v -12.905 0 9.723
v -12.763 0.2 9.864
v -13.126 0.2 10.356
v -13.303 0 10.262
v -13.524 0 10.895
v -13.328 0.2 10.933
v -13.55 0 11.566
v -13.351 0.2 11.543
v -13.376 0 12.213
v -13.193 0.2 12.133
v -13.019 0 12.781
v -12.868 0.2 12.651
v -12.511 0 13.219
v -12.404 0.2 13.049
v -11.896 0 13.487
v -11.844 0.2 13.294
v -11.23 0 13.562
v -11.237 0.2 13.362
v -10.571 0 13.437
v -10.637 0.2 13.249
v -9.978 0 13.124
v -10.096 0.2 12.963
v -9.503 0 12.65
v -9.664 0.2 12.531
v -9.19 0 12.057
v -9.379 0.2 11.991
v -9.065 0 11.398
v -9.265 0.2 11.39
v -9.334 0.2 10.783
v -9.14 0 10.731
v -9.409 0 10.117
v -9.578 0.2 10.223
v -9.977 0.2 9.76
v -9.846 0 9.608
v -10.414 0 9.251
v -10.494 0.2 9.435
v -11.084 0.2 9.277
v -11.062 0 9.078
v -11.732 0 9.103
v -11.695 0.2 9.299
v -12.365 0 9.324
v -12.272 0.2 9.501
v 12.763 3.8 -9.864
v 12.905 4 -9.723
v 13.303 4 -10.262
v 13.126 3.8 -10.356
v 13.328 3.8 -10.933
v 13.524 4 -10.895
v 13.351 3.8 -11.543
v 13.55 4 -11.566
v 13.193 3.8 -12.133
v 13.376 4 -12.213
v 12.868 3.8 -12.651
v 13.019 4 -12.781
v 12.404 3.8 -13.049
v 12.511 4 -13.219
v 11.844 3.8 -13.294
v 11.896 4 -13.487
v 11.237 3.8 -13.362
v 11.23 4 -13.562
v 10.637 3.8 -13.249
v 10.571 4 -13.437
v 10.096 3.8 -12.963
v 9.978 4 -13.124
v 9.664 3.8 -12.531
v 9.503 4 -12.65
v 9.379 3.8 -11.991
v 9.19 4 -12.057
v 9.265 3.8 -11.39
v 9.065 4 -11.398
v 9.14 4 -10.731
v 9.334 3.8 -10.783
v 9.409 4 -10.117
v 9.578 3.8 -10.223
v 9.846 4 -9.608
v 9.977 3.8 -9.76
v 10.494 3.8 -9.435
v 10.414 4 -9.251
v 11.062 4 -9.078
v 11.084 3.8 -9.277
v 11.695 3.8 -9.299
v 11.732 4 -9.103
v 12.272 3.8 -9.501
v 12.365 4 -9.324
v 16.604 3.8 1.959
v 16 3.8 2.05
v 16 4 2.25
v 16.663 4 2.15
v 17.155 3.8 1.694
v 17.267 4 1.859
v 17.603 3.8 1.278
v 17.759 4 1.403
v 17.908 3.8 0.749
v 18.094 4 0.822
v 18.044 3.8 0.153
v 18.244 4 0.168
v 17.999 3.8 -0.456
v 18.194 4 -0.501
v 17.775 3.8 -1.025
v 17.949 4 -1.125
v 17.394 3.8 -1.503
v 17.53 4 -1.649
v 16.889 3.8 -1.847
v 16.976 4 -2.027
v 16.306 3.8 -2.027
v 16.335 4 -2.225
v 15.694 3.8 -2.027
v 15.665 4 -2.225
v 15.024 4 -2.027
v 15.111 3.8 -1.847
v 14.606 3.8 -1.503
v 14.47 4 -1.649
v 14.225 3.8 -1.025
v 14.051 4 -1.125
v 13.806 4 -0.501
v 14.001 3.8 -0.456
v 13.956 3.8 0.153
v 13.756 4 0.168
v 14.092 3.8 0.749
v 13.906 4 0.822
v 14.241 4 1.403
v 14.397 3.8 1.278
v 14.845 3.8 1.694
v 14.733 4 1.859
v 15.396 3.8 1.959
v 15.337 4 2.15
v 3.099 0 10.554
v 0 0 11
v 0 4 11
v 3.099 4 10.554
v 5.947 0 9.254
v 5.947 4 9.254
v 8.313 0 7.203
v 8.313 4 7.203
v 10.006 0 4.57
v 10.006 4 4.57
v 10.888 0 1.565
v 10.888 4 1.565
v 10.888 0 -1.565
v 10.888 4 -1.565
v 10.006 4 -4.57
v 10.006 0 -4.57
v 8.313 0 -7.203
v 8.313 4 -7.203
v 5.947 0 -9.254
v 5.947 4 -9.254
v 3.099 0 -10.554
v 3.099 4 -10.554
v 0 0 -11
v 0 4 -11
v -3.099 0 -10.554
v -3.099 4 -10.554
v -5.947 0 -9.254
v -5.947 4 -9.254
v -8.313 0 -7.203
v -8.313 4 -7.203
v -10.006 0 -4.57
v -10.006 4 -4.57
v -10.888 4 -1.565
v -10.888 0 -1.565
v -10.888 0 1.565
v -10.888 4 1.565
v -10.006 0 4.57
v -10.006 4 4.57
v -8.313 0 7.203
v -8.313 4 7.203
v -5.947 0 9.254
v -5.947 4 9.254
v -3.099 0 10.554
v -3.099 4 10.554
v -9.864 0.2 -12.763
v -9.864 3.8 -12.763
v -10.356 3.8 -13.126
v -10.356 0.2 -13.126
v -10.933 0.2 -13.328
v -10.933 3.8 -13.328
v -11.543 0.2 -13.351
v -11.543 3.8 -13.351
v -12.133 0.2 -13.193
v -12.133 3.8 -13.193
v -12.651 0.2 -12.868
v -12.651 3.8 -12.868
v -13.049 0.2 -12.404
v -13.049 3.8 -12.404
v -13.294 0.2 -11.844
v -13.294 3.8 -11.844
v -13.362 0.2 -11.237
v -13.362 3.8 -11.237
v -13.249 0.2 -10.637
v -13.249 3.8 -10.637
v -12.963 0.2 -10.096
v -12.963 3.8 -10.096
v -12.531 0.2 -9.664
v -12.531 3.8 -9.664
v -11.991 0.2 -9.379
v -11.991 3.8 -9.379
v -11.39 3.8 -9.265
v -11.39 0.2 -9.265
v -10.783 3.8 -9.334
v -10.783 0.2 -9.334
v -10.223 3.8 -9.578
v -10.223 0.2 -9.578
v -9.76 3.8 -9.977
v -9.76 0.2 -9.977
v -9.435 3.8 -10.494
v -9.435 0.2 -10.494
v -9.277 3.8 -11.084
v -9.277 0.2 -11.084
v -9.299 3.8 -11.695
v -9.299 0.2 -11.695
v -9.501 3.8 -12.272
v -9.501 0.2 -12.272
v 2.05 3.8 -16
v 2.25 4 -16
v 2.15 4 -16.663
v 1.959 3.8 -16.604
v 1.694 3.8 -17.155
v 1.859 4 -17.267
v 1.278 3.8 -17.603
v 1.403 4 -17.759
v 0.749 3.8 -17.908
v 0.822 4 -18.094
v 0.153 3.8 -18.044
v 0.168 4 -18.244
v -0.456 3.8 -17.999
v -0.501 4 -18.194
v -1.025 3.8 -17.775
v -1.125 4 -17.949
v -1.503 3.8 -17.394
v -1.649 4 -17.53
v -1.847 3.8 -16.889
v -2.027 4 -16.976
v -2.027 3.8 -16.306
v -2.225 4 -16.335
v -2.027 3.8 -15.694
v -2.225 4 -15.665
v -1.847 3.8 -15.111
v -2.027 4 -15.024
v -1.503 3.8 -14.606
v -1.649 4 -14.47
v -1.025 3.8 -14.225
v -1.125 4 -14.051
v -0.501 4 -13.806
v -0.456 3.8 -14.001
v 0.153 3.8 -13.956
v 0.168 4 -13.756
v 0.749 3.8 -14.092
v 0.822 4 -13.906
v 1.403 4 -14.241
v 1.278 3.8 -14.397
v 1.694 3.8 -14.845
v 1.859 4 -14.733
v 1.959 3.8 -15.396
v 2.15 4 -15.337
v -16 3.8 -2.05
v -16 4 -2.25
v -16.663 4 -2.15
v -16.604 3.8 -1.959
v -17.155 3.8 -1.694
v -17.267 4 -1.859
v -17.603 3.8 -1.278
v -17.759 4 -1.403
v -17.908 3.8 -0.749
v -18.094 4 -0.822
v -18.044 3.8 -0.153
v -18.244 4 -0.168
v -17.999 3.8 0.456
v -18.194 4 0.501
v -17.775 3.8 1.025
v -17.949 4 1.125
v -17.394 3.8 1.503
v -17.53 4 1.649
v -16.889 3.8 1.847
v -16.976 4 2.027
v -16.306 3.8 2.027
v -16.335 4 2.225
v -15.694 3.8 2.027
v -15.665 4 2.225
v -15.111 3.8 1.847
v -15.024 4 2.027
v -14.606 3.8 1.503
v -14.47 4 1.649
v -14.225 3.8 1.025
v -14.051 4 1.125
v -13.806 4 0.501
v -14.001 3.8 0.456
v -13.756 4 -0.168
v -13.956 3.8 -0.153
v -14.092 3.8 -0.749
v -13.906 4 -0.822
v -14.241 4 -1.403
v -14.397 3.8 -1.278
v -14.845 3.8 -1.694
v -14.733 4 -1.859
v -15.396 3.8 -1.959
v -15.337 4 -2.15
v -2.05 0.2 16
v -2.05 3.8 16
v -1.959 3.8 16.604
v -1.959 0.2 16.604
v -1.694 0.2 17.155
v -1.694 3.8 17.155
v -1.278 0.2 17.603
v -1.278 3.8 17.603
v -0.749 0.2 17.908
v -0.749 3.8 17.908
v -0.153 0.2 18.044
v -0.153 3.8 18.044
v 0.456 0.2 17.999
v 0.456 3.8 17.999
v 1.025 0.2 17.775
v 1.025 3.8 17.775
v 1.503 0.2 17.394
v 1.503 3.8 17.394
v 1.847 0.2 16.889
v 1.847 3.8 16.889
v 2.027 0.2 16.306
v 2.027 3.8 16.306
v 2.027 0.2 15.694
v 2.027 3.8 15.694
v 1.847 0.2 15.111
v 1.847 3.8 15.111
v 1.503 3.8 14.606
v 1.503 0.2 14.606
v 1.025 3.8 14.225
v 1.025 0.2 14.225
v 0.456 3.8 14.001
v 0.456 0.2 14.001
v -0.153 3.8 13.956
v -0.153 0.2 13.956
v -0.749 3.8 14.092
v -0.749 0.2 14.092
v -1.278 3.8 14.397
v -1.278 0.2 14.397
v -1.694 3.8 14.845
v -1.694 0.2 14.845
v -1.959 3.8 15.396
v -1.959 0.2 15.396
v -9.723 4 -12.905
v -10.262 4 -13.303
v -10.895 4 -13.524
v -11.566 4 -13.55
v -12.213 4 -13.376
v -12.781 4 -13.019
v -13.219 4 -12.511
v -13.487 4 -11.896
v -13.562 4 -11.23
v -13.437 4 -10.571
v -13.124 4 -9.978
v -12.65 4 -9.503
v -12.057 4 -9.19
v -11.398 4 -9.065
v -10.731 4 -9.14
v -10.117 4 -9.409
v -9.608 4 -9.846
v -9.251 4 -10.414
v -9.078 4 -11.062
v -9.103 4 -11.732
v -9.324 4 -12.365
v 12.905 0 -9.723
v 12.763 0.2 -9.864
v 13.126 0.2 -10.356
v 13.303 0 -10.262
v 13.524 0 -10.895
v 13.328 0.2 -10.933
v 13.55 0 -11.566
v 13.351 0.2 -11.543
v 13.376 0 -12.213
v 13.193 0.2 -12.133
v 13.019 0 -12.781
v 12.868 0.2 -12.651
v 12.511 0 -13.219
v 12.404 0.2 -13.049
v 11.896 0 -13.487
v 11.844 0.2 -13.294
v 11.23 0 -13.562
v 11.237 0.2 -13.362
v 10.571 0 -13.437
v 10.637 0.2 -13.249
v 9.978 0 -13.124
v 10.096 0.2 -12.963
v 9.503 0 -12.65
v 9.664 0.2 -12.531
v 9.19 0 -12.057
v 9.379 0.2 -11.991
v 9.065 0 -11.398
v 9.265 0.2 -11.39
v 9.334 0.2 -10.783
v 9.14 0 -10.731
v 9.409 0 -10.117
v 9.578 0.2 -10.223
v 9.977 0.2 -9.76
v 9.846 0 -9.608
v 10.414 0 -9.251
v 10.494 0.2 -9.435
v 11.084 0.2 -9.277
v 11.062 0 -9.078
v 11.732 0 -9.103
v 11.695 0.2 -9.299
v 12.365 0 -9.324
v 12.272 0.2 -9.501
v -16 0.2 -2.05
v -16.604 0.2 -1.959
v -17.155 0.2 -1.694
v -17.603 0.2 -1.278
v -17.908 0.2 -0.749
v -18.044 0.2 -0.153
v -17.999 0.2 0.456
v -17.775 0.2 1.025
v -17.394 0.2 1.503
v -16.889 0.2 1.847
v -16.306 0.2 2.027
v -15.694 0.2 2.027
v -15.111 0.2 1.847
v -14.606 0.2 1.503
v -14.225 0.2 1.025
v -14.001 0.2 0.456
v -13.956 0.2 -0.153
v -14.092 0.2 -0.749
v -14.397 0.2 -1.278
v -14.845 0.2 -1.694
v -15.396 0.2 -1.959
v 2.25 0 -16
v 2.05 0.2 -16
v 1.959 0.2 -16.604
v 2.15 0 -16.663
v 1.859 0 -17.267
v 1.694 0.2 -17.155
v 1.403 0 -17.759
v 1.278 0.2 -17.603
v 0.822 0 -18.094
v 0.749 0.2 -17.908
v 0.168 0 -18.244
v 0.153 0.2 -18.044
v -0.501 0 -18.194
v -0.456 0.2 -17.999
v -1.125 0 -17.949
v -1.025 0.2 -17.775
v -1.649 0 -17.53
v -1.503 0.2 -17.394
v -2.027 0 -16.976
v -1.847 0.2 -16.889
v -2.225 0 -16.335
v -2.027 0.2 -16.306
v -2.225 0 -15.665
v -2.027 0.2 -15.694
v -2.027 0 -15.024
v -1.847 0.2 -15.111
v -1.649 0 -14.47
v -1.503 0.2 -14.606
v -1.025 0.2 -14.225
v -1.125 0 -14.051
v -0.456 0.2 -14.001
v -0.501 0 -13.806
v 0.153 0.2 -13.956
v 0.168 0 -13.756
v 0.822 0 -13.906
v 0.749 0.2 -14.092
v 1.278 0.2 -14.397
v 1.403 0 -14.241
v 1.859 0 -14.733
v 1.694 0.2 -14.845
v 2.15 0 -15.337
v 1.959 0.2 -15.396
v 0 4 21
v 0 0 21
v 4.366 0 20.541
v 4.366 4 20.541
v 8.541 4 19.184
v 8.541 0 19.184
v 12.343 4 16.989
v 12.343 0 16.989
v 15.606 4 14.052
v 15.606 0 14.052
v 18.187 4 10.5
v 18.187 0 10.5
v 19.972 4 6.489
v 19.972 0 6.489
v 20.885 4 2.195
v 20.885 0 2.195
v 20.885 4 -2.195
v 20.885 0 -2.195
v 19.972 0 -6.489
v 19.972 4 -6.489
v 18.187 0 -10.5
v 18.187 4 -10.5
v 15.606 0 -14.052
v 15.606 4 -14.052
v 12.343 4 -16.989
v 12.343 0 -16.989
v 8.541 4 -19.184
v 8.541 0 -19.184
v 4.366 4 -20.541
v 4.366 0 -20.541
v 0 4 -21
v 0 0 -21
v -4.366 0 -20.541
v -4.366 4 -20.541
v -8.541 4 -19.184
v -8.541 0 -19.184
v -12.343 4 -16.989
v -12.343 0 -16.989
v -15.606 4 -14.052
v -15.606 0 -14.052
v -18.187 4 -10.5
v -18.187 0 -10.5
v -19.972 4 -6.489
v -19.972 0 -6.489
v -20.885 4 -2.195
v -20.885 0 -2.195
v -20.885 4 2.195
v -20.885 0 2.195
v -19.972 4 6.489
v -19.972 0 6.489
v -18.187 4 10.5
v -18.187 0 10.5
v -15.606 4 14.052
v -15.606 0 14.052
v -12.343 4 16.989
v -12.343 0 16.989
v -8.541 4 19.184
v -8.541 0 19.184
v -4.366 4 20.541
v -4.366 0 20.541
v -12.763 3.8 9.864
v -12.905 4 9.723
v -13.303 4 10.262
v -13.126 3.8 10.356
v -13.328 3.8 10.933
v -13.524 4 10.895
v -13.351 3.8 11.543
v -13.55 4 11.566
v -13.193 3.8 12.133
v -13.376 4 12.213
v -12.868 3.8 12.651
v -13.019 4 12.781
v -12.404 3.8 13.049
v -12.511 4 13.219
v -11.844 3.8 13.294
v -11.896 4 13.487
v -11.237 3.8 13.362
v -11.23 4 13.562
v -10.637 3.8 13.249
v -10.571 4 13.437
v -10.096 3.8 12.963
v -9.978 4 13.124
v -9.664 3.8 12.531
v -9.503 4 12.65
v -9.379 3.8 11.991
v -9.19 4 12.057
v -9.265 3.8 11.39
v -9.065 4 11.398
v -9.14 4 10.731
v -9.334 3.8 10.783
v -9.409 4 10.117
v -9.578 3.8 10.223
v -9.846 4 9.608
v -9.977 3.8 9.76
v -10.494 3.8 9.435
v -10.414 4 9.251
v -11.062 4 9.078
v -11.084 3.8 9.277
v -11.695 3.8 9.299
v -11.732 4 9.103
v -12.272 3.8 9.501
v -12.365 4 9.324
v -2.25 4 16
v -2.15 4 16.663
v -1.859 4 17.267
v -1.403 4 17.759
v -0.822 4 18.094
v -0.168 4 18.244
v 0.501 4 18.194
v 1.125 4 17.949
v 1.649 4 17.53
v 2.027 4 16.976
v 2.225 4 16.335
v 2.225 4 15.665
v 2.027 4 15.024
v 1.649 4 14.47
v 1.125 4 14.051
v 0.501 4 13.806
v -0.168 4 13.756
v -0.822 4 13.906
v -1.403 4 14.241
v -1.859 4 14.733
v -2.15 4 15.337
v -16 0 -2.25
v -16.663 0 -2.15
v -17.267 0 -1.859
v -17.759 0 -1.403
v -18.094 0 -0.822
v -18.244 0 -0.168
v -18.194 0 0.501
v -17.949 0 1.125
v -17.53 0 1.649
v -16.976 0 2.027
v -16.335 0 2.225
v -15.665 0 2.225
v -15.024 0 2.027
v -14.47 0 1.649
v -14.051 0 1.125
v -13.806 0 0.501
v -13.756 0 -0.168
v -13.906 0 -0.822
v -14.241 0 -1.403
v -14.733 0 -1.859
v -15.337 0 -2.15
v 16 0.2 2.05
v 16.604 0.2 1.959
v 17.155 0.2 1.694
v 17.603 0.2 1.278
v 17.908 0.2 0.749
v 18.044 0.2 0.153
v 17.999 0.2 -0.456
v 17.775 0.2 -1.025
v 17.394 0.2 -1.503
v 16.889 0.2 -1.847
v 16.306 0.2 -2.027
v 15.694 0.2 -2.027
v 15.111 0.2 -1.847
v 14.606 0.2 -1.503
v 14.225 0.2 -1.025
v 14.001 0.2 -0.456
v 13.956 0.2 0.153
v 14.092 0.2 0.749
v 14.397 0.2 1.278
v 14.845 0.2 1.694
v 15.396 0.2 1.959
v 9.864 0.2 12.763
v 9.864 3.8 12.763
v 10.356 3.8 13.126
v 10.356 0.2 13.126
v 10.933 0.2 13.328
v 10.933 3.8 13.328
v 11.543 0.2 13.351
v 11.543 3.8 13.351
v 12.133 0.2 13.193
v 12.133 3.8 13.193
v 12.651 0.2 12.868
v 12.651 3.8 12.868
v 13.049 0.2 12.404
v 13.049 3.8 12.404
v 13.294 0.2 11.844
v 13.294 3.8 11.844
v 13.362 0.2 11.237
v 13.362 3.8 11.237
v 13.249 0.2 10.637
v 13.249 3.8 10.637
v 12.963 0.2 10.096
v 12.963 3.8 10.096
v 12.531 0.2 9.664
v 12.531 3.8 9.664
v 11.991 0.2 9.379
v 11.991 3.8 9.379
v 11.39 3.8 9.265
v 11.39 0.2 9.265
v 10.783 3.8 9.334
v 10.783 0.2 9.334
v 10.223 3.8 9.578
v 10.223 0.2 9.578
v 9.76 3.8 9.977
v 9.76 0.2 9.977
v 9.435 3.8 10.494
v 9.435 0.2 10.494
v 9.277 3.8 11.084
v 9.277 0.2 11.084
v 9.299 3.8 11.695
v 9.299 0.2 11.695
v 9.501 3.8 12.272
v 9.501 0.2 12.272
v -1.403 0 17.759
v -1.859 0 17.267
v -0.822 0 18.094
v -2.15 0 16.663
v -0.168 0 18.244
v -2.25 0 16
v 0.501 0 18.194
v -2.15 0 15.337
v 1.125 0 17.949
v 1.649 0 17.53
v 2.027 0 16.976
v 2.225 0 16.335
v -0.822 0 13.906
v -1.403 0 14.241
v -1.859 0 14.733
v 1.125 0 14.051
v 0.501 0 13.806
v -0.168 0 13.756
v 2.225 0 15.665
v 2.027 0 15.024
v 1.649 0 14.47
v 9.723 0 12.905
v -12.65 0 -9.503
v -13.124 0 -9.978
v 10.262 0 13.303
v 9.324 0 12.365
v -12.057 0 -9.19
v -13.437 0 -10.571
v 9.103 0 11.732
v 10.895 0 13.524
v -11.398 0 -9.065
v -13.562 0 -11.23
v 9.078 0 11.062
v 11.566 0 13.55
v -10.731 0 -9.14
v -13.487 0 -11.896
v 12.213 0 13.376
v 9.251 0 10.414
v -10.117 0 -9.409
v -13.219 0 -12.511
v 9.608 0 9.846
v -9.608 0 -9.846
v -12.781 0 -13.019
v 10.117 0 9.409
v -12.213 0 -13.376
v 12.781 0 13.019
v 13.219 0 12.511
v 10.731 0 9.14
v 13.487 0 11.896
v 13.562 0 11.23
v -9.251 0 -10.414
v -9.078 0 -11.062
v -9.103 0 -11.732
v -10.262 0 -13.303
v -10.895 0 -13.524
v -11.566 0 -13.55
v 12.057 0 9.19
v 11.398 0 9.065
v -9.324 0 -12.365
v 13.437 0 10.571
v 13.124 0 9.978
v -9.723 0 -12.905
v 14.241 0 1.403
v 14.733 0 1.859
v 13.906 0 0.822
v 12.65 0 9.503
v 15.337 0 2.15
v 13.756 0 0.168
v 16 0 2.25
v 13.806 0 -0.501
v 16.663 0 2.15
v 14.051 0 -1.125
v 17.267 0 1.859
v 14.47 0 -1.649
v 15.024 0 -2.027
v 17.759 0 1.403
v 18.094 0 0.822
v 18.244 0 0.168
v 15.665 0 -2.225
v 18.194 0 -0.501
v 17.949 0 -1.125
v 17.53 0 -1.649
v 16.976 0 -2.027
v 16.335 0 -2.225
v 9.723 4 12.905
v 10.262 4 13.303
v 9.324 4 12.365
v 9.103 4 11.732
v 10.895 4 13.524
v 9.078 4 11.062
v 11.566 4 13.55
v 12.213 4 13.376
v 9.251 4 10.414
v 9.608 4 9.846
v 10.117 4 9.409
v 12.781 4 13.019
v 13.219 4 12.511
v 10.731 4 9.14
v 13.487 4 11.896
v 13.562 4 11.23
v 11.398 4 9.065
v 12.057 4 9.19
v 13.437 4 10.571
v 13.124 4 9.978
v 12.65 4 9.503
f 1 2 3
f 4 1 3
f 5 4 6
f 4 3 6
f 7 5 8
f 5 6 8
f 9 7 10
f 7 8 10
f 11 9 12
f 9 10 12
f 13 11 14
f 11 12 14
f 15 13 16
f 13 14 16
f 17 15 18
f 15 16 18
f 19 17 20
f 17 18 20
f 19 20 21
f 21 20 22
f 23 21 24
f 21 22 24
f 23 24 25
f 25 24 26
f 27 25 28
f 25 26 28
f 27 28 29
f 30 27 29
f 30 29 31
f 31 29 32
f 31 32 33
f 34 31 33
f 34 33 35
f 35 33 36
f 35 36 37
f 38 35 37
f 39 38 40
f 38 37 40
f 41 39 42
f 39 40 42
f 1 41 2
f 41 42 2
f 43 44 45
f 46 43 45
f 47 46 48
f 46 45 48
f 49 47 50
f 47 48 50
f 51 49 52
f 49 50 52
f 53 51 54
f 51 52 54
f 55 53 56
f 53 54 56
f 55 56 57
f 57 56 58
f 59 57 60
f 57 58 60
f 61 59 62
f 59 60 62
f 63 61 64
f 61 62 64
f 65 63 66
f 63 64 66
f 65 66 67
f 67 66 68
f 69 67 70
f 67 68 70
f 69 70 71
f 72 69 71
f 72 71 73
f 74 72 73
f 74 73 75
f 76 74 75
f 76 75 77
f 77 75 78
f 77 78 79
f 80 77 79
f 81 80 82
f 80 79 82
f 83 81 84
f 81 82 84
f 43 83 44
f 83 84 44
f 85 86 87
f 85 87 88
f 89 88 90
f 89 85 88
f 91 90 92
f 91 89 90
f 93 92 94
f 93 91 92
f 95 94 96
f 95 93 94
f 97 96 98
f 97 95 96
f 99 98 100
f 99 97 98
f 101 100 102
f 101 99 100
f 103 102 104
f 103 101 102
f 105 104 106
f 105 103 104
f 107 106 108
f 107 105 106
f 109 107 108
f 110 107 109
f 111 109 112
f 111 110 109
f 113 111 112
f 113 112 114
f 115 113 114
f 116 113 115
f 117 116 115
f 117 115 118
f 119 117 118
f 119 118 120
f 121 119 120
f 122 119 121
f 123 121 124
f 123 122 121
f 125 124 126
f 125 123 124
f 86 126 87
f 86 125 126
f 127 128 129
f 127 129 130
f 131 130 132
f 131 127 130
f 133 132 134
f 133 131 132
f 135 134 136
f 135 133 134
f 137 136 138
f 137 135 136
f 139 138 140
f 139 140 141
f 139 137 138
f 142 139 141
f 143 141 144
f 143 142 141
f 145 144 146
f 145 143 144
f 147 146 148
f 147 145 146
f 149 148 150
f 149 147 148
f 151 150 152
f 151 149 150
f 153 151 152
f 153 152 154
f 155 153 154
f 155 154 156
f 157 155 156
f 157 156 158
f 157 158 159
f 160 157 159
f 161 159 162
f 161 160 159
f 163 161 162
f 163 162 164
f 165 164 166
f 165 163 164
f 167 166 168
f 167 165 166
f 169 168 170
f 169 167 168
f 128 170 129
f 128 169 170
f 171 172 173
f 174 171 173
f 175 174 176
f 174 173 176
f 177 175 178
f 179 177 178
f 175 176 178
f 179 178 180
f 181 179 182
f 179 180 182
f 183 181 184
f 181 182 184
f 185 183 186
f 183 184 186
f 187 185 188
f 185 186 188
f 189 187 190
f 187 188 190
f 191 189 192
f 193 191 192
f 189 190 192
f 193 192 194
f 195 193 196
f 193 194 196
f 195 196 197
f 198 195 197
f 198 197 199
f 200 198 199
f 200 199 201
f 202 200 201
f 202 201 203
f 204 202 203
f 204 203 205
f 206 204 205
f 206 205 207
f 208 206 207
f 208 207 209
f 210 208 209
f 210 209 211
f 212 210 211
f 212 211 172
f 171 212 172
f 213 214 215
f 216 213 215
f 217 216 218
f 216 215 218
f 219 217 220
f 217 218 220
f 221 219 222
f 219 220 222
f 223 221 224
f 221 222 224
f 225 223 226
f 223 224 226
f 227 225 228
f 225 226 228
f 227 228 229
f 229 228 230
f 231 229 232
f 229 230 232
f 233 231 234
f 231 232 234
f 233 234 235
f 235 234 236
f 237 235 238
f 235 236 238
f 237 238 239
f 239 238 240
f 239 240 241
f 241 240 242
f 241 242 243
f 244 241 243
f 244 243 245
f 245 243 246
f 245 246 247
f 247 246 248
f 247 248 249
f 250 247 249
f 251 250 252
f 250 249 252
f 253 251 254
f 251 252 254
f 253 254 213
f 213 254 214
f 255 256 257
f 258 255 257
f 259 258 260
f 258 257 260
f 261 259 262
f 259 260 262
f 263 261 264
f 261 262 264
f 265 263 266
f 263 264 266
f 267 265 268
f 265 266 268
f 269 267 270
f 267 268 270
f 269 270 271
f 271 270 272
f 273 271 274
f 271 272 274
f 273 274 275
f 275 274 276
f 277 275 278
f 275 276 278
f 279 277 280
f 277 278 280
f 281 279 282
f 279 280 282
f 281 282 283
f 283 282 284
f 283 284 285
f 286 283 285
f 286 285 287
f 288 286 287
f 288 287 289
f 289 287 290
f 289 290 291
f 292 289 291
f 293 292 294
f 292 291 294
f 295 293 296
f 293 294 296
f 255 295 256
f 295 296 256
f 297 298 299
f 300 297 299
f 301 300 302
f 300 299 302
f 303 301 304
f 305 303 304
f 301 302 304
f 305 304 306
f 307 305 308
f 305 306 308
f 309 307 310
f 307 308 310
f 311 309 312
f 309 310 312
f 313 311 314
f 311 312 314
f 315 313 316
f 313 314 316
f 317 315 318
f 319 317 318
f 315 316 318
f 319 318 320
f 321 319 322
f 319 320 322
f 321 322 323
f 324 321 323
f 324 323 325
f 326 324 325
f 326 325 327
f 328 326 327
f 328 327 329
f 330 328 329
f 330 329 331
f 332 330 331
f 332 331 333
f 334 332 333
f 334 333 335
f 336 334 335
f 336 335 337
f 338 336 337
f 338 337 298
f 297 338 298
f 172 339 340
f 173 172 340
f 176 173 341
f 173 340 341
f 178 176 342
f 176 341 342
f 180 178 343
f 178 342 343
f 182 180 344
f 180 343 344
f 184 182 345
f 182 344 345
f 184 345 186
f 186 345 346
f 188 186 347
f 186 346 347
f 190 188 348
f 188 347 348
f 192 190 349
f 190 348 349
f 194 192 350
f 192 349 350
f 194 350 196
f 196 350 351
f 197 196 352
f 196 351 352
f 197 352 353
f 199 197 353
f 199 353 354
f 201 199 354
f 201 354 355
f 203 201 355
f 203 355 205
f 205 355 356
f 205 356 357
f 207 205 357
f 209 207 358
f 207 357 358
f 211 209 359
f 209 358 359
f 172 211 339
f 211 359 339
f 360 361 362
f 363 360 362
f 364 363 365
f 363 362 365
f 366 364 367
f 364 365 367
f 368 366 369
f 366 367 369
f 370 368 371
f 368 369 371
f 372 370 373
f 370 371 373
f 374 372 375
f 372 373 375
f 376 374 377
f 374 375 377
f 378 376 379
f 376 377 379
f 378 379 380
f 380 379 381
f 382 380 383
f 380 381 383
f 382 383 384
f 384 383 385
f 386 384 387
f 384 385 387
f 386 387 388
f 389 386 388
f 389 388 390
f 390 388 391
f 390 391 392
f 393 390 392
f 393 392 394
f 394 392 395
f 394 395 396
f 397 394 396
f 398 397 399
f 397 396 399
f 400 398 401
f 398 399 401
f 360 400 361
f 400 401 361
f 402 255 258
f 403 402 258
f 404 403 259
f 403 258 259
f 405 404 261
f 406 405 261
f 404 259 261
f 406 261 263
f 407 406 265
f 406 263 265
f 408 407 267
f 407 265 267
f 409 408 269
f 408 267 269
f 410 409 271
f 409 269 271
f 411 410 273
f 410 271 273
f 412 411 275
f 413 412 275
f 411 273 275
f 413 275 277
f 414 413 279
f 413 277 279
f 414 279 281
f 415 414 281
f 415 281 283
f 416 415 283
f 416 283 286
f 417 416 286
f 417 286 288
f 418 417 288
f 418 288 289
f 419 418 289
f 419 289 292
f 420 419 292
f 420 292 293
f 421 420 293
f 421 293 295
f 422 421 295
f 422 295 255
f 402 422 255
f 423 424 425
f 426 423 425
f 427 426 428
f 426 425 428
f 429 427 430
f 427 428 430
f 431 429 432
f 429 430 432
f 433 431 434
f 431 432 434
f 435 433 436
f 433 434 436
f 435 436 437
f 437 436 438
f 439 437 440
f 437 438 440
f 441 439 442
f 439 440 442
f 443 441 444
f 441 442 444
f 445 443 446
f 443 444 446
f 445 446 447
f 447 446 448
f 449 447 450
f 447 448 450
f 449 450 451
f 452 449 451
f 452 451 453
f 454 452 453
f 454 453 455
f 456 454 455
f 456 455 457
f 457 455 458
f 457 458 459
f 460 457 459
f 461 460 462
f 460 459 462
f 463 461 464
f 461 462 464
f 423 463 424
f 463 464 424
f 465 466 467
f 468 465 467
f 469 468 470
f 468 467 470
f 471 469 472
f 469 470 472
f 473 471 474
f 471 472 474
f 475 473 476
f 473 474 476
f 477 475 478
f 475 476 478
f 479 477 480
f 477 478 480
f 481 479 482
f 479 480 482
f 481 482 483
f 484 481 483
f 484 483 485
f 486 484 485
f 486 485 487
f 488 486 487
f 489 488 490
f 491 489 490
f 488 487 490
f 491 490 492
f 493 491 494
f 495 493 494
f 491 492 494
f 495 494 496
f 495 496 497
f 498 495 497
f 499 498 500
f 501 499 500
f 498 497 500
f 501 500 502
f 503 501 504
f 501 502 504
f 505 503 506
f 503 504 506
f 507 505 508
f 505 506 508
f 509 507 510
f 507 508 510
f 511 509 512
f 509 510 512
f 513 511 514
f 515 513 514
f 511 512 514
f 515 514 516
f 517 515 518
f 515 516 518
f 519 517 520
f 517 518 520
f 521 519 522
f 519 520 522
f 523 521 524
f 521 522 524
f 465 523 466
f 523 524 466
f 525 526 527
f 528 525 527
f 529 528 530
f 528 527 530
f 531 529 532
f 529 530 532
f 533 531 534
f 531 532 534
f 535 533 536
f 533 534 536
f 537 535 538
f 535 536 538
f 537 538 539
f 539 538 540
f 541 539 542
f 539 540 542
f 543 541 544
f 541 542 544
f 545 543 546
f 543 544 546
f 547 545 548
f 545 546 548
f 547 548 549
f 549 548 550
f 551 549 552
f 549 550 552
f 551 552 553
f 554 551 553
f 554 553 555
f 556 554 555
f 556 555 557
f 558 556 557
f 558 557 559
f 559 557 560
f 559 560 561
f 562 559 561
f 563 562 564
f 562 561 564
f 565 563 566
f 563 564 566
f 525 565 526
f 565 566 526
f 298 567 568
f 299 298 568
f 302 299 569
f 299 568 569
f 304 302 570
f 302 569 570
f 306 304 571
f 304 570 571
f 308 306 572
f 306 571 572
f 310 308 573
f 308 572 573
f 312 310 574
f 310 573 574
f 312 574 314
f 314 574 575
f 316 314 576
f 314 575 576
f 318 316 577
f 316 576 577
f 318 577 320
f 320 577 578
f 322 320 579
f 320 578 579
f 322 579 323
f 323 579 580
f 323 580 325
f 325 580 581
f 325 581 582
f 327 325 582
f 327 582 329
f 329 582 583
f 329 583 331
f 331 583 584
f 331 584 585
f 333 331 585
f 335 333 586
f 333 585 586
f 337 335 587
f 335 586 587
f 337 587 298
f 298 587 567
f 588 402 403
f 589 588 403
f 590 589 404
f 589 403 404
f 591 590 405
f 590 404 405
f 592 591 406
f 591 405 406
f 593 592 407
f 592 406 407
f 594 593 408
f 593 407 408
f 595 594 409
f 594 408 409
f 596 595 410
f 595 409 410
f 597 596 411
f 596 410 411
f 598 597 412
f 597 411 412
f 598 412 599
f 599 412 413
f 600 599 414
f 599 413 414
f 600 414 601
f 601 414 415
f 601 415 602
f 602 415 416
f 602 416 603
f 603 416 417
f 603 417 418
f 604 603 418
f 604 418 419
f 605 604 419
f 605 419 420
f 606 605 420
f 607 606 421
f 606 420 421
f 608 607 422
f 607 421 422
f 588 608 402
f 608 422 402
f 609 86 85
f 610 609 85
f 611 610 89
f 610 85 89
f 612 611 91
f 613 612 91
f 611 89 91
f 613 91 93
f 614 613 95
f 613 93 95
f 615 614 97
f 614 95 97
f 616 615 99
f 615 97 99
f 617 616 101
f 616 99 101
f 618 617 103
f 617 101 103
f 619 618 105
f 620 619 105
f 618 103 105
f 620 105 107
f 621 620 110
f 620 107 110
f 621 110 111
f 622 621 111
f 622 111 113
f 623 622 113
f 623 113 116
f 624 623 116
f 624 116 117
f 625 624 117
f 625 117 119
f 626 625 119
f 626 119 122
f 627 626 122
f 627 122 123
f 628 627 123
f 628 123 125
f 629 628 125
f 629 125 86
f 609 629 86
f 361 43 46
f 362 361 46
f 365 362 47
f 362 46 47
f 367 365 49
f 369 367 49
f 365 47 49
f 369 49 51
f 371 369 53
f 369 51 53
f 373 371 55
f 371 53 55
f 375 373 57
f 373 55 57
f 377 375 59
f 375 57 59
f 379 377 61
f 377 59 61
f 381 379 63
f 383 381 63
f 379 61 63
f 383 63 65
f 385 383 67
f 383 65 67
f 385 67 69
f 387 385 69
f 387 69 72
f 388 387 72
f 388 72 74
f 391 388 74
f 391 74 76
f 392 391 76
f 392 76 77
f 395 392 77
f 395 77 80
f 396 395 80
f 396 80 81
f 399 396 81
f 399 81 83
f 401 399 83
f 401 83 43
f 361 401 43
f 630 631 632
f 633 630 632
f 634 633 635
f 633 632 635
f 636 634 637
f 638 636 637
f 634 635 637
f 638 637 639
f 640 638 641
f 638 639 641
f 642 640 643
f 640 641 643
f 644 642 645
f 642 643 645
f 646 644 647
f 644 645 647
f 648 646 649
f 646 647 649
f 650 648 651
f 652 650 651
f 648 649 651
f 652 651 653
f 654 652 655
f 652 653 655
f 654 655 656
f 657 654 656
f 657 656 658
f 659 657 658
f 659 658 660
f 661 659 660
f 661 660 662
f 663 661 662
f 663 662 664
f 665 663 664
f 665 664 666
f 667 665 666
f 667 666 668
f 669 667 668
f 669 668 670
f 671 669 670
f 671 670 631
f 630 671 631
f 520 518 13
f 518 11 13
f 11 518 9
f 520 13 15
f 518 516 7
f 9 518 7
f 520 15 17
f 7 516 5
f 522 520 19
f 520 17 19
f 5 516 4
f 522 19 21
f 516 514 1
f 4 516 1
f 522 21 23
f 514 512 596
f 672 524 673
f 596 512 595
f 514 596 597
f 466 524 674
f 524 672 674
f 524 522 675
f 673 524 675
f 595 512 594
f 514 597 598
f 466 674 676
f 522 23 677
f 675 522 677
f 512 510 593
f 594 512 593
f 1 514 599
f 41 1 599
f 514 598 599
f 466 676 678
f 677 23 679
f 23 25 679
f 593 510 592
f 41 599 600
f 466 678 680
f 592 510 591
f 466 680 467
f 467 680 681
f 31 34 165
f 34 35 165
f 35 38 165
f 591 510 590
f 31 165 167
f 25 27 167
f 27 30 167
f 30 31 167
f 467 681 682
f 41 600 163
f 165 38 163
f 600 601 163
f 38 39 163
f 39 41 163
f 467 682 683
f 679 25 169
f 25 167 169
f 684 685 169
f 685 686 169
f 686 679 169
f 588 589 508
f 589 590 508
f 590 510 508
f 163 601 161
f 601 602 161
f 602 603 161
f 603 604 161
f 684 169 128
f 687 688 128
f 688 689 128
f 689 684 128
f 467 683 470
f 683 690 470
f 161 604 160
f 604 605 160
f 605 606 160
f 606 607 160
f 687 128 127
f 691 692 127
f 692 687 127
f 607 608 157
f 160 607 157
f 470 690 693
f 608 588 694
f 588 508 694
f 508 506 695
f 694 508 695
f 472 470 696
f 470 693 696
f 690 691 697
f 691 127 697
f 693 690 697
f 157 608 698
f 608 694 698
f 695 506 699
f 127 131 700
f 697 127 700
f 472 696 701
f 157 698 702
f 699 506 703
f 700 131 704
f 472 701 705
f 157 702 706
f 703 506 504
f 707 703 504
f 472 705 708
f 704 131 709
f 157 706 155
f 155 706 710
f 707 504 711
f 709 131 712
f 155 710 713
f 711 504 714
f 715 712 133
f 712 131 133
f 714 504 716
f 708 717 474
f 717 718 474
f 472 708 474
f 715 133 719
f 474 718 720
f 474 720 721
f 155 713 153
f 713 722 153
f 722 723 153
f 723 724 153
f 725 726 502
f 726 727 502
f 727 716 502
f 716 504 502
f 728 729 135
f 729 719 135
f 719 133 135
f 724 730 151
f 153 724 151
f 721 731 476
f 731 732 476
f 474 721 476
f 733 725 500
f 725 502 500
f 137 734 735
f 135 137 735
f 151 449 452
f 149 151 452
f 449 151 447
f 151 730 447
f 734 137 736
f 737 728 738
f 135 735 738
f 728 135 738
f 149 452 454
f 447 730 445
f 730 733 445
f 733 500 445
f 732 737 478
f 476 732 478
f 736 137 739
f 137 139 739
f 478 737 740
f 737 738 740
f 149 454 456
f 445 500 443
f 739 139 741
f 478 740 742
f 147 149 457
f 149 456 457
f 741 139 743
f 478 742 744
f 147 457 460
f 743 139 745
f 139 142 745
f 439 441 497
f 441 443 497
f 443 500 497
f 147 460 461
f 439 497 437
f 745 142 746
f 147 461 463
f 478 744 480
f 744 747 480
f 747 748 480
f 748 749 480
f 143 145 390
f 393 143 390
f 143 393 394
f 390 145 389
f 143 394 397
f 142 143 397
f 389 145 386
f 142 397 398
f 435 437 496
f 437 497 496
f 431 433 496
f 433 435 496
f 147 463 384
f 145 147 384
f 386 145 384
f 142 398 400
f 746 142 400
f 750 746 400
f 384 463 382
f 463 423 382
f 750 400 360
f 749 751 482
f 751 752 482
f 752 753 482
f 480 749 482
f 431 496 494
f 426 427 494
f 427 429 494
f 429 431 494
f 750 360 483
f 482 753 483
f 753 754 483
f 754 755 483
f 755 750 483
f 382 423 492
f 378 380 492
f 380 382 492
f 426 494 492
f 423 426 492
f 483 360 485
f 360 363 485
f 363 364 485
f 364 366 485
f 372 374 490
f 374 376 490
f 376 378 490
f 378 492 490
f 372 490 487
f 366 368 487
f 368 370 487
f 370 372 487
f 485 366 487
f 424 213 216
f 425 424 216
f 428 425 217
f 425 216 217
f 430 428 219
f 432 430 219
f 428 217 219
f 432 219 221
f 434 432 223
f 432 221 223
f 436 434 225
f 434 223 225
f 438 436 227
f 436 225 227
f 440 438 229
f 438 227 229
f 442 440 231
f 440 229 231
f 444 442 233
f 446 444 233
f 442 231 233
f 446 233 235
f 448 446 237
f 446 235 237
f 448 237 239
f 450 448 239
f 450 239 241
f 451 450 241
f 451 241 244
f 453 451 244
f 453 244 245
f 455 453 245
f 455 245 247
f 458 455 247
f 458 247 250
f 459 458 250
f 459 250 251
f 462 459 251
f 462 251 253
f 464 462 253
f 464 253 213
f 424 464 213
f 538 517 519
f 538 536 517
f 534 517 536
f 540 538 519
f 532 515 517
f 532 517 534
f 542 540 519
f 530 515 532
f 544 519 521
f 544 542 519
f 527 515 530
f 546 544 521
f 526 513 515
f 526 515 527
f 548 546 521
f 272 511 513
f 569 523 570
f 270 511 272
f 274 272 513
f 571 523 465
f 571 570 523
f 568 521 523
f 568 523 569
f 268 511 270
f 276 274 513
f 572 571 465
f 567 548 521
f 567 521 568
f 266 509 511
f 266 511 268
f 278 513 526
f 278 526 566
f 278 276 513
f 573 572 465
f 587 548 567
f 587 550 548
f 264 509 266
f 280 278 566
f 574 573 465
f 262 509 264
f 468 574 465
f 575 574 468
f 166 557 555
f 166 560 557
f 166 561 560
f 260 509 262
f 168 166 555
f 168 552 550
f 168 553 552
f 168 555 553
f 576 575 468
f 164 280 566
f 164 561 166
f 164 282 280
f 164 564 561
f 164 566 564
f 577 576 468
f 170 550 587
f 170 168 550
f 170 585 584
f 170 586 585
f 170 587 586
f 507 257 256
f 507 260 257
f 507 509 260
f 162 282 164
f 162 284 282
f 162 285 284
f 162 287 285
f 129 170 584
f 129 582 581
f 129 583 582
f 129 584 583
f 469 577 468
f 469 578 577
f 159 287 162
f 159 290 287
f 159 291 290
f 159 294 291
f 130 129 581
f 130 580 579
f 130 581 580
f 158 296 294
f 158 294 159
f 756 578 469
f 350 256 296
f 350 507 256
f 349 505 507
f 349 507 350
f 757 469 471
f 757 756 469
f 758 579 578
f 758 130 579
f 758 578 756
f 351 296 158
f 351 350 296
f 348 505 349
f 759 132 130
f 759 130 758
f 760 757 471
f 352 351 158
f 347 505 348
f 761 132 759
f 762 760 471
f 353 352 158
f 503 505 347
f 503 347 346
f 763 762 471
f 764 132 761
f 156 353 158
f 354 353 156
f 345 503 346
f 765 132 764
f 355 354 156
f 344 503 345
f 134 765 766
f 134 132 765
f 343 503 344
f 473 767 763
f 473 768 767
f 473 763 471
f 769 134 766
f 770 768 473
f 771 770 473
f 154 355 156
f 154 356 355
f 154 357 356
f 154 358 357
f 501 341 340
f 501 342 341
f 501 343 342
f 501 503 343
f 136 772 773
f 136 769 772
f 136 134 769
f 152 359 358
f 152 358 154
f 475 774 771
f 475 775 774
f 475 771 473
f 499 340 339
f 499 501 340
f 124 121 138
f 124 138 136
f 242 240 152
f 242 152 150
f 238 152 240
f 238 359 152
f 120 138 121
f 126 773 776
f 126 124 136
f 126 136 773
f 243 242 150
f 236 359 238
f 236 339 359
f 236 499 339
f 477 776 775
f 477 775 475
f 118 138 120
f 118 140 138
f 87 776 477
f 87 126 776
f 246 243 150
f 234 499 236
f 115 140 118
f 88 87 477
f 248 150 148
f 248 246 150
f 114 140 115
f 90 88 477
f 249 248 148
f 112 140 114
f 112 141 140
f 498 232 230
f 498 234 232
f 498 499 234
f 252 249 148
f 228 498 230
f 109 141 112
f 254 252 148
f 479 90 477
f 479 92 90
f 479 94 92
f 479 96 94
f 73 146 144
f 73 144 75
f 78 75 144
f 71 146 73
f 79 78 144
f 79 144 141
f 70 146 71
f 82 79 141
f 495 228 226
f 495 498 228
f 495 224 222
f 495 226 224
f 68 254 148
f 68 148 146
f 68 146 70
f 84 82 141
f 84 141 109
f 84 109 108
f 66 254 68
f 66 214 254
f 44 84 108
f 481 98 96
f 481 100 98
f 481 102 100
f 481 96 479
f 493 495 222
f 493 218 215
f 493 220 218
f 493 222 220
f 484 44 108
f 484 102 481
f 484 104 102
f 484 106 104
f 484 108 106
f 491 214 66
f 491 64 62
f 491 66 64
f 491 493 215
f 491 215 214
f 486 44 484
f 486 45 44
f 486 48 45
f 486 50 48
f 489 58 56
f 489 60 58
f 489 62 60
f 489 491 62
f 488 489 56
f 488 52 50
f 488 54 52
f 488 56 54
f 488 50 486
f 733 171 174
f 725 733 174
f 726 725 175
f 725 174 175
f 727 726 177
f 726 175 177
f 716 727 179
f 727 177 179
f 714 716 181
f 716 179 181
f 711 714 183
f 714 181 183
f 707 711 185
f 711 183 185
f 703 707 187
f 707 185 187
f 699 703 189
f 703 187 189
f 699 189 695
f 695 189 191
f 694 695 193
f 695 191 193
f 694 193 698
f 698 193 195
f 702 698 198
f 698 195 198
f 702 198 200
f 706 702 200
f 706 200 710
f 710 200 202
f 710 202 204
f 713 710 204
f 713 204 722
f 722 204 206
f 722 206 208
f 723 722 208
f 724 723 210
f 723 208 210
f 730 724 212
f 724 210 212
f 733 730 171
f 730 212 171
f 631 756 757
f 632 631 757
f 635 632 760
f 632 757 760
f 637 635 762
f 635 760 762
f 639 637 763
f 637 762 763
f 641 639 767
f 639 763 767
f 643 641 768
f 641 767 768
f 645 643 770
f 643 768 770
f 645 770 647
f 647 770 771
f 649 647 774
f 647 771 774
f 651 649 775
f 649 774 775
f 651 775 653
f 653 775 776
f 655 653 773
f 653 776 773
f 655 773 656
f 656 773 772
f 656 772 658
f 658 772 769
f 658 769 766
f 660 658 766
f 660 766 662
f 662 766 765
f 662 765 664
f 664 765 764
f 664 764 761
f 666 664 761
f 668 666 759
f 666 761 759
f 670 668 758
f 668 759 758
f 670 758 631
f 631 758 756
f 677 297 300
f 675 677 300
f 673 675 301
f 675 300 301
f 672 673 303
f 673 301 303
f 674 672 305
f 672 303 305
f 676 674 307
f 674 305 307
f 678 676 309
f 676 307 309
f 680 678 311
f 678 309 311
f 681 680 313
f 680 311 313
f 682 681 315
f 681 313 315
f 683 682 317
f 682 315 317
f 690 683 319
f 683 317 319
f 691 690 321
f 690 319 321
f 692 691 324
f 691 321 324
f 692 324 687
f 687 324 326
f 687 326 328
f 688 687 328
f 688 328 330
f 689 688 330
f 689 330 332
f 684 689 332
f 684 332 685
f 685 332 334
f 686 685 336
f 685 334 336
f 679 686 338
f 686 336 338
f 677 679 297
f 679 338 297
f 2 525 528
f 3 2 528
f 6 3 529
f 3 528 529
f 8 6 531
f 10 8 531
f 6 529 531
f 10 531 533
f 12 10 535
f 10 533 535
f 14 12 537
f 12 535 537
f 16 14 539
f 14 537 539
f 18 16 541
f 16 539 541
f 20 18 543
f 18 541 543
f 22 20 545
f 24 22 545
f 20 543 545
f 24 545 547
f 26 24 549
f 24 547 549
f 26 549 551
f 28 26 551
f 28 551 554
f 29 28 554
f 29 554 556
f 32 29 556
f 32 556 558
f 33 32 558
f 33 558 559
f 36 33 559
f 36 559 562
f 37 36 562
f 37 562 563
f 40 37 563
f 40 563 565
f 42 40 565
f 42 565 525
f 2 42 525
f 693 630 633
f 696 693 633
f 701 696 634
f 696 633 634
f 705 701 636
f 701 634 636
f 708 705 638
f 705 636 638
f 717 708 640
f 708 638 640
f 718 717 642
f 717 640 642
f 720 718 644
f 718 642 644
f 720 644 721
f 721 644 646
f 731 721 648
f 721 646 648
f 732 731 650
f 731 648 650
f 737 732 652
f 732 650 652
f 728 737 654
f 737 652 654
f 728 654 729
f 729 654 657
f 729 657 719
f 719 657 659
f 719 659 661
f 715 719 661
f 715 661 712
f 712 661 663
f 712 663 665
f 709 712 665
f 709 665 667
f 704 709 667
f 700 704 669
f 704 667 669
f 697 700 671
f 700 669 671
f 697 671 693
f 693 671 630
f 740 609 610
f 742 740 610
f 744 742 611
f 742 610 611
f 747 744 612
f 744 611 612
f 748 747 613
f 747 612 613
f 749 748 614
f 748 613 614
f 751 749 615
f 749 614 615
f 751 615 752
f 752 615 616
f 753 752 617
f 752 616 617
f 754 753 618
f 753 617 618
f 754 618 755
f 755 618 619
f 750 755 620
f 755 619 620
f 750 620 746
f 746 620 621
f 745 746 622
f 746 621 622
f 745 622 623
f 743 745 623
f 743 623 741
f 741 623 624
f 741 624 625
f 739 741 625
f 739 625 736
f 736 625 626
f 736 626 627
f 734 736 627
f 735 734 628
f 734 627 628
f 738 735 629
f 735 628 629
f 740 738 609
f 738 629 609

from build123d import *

# Parameters (mm, degrees)
SKETCH1_R                    = 21
SKETCH1_R_2                  = 16
SKETCH1_R_3                  = 11
BOSS_EXTRUDE1_DEPTH          = 4
SKETCH2_R                    = 2.05
CUT_EXTRUDE1_DEPTH           = 30.966648128
CHAMFER1_SIZE                = 0.2
CIRPATTERN1_COUNT            = 8
CHAMFER1_OF_CIRPATTERN1_SIZE = 0.2


with BuildPart() as part:
    # Sketch1 → Boss-Extrude1 (new body)
    # profile 1 of 2: a face of its own
    with BuildSketch(Plane(origin=(0, 0, 0), x_dir=(1, 0, 0), z_dir=(0, 1, 0))):
        with Locations(Location((0, 0, 0), (0, 0, 270))):
            Circle(SKETCH1_R)
        Circle(SKETCH1_R_2, mode=Mode.SUBTRACT)
    # profile 2 of 2: a face of its own
    with BuildSketch(Plane(origin=(0, 0, 0), x_dir=(1, 0, 0), z_dir=(0, 1, 0))):
        Circle(SKETCH1_R_2)
        with Locations(Location((0, 0, 0), (0, 0, 270))):
            Circle(SKETCH1_R_3, mode=Mode.SUBTRACT)
    extrude(amount=BOSS_EXTRUDE1_DEPTH)

    # Sketch2 → Cut-Extrude1 (cut, through all)
    with BuildSketch(Plane(origin=(0, 4, 0), x_dir=(1, 0, 0), z_dir=(0, 1, 0))):
        with Locations(Location((16, 0, 0), (0, 0, 270))):
            Circle(SKETCH2_R)
    cut_extrude1 = extrude(amount=-CUT_EXTRUDE1_DEPTH, mode=Mode.SUBTRACT)

    # Chamfer1
    chamfer1_edges = [part.edges().sort_by_distance(p)[0] for p in [
        (16, 0, -2.05),
        (16, 4, -2.05),
    ]]
    chamfer(chamfer1_edges, length=CHAMFER1_SIZE)

    # CirPattern1: Cut-Extrude1 ×8 about axis
    cirpattern1_axis = Axis((0, 0, 0), (0, 1, 0))
    for i in range(1, CIRPATTERN1_COUNT):
        add(cut_extrude1.rotate(cirpattern1_axis, i * 360 / CIRPATTERN1_COUNT), mode=Mode.SUBTRACT)

    # Chamfer1 of CirPattern1
    chamfer1_of_cirpattern1_edges = [part.edges().sort_by_distance(p)[0] for p in [
        (9.864139598, 0, -12.7632774),
        (9.864139598, 4, -12.7632774),
        (-2.05, 0, -16),
        (-2.05, 4, -16),
        (-12.7632774, 0, -9.864139598),
        (-12.7632774, 4, -9.864139598),
        (-16, 0, 2.05),
        (-16, 4, 2.05),
        (-9.864139598, 0, 12.7632774),
        (-9.864139598, 4, 12.7632774),
        (2.05, 0, 16),
        (2.05, 4, 16),
        (12.7632774, 0, 9.864139598),
        (12.7632774, 4, 9.864139598),
    ]]
    chamfer(chamfer1_of_cirpattern1_edges, length=CHAMFER1_OF_CIRPATTERN1_SIZE)


solid = part.part
